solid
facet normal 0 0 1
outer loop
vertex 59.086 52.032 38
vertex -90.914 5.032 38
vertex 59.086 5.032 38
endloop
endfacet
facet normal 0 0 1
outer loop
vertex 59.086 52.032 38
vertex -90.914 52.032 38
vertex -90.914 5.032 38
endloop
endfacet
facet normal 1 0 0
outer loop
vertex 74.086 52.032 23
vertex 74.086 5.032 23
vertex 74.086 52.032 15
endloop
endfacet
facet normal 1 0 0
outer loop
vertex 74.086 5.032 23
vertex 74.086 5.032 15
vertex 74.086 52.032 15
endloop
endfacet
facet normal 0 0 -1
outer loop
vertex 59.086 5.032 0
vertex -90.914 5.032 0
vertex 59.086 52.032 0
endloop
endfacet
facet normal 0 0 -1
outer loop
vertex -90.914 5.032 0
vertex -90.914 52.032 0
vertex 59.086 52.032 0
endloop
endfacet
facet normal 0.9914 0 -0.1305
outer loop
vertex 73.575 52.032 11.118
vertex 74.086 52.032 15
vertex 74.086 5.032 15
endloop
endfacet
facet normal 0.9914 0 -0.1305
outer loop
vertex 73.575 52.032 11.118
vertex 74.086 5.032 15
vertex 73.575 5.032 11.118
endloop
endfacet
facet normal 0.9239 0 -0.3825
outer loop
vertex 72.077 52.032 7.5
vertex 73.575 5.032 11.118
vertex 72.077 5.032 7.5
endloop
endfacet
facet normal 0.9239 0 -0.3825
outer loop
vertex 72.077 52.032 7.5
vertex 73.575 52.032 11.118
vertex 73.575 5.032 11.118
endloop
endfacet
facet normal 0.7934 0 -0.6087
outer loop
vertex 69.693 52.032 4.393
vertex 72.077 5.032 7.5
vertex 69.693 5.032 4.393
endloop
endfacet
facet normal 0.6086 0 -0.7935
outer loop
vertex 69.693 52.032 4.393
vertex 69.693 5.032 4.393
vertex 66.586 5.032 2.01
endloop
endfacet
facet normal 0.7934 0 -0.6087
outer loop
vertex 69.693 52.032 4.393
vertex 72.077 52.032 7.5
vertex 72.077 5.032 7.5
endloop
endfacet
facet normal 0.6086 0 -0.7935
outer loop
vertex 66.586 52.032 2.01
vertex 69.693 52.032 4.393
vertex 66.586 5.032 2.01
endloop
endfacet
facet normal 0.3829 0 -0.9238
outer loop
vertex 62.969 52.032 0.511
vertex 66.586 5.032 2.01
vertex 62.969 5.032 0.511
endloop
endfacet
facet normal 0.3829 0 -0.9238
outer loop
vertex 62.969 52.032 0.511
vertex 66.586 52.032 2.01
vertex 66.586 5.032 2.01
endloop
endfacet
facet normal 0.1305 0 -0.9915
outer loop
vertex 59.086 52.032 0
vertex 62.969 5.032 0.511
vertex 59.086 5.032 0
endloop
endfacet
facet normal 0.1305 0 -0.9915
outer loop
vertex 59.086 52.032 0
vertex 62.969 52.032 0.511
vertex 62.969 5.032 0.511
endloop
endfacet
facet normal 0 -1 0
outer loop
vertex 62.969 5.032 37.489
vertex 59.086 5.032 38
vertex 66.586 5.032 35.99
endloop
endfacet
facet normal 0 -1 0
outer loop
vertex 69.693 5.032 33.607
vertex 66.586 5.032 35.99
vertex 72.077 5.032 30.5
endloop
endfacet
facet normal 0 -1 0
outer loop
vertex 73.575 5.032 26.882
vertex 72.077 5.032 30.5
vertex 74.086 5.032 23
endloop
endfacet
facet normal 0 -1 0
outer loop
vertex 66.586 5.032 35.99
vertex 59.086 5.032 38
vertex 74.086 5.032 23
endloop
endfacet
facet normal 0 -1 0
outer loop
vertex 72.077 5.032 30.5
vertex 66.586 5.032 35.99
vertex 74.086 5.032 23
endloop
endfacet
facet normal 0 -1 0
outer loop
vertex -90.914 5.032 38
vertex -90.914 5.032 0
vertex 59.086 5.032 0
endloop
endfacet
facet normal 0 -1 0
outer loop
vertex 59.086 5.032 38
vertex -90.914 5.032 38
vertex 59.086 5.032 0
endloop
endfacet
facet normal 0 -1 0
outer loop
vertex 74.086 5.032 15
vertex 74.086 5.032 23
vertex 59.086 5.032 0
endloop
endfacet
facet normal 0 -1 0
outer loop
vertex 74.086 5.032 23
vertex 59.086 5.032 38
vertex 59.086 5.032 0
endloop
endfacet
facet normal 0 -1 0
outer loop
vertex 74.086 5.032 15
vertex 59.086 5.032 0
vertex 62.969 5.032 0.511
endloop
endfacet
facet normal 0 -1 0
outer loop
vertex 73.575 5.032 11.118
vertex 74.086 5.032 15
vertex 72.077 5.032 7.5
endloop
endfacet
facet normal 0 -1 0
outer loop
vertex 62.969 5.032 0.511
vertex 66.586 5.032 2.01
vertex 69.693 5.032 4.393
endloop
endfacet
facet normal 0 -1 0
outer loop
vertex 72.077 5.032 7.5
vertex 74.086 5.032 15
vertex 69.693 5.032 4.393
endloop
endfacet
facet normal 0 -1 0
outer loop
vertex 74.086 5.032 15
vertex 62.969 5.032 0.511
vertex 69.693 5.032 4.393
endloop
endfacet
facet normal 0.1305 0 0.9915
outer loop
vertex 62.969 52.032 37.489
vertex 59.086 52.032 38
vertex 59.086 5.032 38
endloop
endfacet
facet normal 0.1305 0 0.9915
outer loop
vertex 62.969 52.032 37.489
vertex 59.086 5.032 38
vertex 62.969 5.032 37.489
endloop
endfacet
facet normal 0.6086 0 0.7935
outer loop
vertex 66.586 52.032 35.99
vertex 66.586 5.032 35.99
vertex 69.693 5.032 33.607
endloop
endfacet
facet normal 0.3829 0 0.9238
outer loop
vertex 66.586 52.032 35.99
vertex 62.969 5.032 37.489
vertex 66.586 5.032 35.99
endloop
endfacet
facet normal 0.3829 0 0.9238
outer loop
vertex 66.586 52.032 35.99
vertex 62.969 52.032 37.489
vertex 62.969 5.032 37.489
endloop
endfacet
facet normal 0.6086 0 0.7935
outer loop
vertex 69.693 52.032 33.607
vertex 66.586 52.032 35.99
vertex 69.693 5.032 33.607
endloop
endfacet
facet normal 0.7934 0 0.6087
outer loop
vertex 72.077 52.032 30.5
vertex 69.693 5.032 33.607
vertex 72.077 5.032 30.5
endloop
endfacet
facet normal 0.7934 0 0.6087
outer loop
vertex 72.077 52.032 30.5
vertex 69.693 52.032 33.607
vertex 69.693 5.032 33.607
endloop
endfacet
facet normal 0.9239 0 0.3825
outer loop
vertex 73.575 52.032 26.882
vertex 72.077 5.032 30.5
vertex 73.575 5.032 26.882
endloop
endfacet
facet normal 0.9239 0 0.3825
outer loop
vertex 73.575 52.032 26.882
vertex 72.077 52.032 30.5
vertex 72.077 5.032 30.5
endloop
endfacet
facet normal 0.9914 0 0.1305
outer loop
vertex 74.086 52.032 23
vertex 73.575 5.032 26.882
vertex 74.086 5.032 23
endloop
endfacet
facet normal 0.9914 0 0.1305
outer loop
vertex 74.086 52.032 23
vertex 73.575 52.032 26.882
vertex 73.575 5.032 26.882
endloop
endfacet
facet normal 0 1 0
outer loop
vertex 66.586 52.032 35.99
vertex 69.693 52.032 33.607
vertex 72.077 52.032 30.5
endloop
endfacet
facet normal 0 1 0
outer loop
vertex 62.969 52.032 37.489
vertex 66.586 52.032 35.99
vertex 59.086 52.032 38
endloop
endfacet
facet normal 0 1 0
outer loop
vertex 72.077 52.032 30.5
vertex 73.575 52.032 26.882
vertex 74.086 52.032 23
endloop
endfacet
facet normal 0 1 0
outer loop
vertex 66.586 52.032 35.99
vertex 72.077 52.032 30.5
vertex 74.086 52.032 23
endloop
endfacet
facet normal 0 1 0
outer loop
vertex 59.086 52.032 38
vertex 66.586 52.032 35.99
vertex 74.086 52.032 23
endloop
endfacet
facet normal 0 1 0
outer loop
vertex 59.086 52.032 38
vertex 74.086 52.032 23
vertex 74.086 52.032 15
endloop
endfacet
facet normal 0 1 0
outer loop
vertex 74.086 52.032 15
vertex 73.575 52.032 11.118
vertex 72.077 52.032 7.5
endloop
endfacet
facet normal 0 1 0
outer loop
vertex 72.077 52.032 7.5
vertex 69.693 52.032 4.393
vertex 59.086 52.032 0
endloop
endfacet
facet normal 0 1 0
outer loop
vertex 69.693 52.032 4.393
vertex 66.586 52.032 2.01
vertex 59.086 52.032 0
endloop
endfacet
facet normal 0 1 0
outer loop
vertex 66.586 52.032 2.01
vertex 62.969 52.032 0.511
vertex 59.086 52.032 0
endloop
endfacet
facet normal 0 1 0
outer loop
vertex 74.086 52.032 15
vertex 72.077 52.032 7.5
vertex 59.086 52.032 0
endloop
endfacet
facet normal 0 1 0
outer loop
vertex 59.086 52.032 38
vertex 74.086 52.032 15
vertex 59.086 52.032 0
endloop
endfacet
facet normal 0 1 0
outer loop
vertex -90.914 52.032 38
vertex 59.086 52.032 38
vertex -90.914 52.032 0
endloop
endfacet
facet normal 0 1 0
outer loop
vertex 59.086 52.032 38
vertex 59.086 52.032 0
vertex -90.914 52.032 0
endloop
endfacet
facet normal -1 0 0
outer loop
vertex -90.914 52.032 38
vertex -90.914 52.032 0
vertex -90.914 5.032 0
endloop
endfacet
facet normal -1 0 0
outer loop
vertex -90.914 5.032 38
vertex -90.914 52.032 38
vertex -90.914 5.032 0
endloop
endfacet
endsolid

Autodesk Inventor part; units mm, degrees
ref_plane "YZ Plane" through (0, 0, 0) normal (1, 0, 0) x (0, 1, 0)
ref_plane "XZ Plane" through (0, 0, 0) normal (0, 1, 0) x (-1, 0, 0)
ref_plane "XY Plane" through (0, 0, 0) normal (0, 0, 1) x (1, 0, 0)
sketch "Эскиз1" plane through (0, 0, 0) normal (0, 0, 1) x (1, 0, 0)
  line L0 (74.0863, 52.032) -> (-90.9137, 52.032)
  line L1 (-90.9137, 52.032) -> (-90.9137, 5.032)
  line L2 (-90.9137, 5.032) -> (74.0863, 5.032)
  line L3 (74.0863, 5.032) -> (74.0863, 52.032)
  point P0 (0, 0)
  dimension "d0" = 47
  dimension "d1" = 165
extrude "Выдавливание1" add sketch "Эскиз1" along normal blind 38
fillet "Сопряжение1" radius 15 2 edges at (74.0863, 28.532, 38) (74.0863, 28.532, 0)
properties part number "akkum16v"
